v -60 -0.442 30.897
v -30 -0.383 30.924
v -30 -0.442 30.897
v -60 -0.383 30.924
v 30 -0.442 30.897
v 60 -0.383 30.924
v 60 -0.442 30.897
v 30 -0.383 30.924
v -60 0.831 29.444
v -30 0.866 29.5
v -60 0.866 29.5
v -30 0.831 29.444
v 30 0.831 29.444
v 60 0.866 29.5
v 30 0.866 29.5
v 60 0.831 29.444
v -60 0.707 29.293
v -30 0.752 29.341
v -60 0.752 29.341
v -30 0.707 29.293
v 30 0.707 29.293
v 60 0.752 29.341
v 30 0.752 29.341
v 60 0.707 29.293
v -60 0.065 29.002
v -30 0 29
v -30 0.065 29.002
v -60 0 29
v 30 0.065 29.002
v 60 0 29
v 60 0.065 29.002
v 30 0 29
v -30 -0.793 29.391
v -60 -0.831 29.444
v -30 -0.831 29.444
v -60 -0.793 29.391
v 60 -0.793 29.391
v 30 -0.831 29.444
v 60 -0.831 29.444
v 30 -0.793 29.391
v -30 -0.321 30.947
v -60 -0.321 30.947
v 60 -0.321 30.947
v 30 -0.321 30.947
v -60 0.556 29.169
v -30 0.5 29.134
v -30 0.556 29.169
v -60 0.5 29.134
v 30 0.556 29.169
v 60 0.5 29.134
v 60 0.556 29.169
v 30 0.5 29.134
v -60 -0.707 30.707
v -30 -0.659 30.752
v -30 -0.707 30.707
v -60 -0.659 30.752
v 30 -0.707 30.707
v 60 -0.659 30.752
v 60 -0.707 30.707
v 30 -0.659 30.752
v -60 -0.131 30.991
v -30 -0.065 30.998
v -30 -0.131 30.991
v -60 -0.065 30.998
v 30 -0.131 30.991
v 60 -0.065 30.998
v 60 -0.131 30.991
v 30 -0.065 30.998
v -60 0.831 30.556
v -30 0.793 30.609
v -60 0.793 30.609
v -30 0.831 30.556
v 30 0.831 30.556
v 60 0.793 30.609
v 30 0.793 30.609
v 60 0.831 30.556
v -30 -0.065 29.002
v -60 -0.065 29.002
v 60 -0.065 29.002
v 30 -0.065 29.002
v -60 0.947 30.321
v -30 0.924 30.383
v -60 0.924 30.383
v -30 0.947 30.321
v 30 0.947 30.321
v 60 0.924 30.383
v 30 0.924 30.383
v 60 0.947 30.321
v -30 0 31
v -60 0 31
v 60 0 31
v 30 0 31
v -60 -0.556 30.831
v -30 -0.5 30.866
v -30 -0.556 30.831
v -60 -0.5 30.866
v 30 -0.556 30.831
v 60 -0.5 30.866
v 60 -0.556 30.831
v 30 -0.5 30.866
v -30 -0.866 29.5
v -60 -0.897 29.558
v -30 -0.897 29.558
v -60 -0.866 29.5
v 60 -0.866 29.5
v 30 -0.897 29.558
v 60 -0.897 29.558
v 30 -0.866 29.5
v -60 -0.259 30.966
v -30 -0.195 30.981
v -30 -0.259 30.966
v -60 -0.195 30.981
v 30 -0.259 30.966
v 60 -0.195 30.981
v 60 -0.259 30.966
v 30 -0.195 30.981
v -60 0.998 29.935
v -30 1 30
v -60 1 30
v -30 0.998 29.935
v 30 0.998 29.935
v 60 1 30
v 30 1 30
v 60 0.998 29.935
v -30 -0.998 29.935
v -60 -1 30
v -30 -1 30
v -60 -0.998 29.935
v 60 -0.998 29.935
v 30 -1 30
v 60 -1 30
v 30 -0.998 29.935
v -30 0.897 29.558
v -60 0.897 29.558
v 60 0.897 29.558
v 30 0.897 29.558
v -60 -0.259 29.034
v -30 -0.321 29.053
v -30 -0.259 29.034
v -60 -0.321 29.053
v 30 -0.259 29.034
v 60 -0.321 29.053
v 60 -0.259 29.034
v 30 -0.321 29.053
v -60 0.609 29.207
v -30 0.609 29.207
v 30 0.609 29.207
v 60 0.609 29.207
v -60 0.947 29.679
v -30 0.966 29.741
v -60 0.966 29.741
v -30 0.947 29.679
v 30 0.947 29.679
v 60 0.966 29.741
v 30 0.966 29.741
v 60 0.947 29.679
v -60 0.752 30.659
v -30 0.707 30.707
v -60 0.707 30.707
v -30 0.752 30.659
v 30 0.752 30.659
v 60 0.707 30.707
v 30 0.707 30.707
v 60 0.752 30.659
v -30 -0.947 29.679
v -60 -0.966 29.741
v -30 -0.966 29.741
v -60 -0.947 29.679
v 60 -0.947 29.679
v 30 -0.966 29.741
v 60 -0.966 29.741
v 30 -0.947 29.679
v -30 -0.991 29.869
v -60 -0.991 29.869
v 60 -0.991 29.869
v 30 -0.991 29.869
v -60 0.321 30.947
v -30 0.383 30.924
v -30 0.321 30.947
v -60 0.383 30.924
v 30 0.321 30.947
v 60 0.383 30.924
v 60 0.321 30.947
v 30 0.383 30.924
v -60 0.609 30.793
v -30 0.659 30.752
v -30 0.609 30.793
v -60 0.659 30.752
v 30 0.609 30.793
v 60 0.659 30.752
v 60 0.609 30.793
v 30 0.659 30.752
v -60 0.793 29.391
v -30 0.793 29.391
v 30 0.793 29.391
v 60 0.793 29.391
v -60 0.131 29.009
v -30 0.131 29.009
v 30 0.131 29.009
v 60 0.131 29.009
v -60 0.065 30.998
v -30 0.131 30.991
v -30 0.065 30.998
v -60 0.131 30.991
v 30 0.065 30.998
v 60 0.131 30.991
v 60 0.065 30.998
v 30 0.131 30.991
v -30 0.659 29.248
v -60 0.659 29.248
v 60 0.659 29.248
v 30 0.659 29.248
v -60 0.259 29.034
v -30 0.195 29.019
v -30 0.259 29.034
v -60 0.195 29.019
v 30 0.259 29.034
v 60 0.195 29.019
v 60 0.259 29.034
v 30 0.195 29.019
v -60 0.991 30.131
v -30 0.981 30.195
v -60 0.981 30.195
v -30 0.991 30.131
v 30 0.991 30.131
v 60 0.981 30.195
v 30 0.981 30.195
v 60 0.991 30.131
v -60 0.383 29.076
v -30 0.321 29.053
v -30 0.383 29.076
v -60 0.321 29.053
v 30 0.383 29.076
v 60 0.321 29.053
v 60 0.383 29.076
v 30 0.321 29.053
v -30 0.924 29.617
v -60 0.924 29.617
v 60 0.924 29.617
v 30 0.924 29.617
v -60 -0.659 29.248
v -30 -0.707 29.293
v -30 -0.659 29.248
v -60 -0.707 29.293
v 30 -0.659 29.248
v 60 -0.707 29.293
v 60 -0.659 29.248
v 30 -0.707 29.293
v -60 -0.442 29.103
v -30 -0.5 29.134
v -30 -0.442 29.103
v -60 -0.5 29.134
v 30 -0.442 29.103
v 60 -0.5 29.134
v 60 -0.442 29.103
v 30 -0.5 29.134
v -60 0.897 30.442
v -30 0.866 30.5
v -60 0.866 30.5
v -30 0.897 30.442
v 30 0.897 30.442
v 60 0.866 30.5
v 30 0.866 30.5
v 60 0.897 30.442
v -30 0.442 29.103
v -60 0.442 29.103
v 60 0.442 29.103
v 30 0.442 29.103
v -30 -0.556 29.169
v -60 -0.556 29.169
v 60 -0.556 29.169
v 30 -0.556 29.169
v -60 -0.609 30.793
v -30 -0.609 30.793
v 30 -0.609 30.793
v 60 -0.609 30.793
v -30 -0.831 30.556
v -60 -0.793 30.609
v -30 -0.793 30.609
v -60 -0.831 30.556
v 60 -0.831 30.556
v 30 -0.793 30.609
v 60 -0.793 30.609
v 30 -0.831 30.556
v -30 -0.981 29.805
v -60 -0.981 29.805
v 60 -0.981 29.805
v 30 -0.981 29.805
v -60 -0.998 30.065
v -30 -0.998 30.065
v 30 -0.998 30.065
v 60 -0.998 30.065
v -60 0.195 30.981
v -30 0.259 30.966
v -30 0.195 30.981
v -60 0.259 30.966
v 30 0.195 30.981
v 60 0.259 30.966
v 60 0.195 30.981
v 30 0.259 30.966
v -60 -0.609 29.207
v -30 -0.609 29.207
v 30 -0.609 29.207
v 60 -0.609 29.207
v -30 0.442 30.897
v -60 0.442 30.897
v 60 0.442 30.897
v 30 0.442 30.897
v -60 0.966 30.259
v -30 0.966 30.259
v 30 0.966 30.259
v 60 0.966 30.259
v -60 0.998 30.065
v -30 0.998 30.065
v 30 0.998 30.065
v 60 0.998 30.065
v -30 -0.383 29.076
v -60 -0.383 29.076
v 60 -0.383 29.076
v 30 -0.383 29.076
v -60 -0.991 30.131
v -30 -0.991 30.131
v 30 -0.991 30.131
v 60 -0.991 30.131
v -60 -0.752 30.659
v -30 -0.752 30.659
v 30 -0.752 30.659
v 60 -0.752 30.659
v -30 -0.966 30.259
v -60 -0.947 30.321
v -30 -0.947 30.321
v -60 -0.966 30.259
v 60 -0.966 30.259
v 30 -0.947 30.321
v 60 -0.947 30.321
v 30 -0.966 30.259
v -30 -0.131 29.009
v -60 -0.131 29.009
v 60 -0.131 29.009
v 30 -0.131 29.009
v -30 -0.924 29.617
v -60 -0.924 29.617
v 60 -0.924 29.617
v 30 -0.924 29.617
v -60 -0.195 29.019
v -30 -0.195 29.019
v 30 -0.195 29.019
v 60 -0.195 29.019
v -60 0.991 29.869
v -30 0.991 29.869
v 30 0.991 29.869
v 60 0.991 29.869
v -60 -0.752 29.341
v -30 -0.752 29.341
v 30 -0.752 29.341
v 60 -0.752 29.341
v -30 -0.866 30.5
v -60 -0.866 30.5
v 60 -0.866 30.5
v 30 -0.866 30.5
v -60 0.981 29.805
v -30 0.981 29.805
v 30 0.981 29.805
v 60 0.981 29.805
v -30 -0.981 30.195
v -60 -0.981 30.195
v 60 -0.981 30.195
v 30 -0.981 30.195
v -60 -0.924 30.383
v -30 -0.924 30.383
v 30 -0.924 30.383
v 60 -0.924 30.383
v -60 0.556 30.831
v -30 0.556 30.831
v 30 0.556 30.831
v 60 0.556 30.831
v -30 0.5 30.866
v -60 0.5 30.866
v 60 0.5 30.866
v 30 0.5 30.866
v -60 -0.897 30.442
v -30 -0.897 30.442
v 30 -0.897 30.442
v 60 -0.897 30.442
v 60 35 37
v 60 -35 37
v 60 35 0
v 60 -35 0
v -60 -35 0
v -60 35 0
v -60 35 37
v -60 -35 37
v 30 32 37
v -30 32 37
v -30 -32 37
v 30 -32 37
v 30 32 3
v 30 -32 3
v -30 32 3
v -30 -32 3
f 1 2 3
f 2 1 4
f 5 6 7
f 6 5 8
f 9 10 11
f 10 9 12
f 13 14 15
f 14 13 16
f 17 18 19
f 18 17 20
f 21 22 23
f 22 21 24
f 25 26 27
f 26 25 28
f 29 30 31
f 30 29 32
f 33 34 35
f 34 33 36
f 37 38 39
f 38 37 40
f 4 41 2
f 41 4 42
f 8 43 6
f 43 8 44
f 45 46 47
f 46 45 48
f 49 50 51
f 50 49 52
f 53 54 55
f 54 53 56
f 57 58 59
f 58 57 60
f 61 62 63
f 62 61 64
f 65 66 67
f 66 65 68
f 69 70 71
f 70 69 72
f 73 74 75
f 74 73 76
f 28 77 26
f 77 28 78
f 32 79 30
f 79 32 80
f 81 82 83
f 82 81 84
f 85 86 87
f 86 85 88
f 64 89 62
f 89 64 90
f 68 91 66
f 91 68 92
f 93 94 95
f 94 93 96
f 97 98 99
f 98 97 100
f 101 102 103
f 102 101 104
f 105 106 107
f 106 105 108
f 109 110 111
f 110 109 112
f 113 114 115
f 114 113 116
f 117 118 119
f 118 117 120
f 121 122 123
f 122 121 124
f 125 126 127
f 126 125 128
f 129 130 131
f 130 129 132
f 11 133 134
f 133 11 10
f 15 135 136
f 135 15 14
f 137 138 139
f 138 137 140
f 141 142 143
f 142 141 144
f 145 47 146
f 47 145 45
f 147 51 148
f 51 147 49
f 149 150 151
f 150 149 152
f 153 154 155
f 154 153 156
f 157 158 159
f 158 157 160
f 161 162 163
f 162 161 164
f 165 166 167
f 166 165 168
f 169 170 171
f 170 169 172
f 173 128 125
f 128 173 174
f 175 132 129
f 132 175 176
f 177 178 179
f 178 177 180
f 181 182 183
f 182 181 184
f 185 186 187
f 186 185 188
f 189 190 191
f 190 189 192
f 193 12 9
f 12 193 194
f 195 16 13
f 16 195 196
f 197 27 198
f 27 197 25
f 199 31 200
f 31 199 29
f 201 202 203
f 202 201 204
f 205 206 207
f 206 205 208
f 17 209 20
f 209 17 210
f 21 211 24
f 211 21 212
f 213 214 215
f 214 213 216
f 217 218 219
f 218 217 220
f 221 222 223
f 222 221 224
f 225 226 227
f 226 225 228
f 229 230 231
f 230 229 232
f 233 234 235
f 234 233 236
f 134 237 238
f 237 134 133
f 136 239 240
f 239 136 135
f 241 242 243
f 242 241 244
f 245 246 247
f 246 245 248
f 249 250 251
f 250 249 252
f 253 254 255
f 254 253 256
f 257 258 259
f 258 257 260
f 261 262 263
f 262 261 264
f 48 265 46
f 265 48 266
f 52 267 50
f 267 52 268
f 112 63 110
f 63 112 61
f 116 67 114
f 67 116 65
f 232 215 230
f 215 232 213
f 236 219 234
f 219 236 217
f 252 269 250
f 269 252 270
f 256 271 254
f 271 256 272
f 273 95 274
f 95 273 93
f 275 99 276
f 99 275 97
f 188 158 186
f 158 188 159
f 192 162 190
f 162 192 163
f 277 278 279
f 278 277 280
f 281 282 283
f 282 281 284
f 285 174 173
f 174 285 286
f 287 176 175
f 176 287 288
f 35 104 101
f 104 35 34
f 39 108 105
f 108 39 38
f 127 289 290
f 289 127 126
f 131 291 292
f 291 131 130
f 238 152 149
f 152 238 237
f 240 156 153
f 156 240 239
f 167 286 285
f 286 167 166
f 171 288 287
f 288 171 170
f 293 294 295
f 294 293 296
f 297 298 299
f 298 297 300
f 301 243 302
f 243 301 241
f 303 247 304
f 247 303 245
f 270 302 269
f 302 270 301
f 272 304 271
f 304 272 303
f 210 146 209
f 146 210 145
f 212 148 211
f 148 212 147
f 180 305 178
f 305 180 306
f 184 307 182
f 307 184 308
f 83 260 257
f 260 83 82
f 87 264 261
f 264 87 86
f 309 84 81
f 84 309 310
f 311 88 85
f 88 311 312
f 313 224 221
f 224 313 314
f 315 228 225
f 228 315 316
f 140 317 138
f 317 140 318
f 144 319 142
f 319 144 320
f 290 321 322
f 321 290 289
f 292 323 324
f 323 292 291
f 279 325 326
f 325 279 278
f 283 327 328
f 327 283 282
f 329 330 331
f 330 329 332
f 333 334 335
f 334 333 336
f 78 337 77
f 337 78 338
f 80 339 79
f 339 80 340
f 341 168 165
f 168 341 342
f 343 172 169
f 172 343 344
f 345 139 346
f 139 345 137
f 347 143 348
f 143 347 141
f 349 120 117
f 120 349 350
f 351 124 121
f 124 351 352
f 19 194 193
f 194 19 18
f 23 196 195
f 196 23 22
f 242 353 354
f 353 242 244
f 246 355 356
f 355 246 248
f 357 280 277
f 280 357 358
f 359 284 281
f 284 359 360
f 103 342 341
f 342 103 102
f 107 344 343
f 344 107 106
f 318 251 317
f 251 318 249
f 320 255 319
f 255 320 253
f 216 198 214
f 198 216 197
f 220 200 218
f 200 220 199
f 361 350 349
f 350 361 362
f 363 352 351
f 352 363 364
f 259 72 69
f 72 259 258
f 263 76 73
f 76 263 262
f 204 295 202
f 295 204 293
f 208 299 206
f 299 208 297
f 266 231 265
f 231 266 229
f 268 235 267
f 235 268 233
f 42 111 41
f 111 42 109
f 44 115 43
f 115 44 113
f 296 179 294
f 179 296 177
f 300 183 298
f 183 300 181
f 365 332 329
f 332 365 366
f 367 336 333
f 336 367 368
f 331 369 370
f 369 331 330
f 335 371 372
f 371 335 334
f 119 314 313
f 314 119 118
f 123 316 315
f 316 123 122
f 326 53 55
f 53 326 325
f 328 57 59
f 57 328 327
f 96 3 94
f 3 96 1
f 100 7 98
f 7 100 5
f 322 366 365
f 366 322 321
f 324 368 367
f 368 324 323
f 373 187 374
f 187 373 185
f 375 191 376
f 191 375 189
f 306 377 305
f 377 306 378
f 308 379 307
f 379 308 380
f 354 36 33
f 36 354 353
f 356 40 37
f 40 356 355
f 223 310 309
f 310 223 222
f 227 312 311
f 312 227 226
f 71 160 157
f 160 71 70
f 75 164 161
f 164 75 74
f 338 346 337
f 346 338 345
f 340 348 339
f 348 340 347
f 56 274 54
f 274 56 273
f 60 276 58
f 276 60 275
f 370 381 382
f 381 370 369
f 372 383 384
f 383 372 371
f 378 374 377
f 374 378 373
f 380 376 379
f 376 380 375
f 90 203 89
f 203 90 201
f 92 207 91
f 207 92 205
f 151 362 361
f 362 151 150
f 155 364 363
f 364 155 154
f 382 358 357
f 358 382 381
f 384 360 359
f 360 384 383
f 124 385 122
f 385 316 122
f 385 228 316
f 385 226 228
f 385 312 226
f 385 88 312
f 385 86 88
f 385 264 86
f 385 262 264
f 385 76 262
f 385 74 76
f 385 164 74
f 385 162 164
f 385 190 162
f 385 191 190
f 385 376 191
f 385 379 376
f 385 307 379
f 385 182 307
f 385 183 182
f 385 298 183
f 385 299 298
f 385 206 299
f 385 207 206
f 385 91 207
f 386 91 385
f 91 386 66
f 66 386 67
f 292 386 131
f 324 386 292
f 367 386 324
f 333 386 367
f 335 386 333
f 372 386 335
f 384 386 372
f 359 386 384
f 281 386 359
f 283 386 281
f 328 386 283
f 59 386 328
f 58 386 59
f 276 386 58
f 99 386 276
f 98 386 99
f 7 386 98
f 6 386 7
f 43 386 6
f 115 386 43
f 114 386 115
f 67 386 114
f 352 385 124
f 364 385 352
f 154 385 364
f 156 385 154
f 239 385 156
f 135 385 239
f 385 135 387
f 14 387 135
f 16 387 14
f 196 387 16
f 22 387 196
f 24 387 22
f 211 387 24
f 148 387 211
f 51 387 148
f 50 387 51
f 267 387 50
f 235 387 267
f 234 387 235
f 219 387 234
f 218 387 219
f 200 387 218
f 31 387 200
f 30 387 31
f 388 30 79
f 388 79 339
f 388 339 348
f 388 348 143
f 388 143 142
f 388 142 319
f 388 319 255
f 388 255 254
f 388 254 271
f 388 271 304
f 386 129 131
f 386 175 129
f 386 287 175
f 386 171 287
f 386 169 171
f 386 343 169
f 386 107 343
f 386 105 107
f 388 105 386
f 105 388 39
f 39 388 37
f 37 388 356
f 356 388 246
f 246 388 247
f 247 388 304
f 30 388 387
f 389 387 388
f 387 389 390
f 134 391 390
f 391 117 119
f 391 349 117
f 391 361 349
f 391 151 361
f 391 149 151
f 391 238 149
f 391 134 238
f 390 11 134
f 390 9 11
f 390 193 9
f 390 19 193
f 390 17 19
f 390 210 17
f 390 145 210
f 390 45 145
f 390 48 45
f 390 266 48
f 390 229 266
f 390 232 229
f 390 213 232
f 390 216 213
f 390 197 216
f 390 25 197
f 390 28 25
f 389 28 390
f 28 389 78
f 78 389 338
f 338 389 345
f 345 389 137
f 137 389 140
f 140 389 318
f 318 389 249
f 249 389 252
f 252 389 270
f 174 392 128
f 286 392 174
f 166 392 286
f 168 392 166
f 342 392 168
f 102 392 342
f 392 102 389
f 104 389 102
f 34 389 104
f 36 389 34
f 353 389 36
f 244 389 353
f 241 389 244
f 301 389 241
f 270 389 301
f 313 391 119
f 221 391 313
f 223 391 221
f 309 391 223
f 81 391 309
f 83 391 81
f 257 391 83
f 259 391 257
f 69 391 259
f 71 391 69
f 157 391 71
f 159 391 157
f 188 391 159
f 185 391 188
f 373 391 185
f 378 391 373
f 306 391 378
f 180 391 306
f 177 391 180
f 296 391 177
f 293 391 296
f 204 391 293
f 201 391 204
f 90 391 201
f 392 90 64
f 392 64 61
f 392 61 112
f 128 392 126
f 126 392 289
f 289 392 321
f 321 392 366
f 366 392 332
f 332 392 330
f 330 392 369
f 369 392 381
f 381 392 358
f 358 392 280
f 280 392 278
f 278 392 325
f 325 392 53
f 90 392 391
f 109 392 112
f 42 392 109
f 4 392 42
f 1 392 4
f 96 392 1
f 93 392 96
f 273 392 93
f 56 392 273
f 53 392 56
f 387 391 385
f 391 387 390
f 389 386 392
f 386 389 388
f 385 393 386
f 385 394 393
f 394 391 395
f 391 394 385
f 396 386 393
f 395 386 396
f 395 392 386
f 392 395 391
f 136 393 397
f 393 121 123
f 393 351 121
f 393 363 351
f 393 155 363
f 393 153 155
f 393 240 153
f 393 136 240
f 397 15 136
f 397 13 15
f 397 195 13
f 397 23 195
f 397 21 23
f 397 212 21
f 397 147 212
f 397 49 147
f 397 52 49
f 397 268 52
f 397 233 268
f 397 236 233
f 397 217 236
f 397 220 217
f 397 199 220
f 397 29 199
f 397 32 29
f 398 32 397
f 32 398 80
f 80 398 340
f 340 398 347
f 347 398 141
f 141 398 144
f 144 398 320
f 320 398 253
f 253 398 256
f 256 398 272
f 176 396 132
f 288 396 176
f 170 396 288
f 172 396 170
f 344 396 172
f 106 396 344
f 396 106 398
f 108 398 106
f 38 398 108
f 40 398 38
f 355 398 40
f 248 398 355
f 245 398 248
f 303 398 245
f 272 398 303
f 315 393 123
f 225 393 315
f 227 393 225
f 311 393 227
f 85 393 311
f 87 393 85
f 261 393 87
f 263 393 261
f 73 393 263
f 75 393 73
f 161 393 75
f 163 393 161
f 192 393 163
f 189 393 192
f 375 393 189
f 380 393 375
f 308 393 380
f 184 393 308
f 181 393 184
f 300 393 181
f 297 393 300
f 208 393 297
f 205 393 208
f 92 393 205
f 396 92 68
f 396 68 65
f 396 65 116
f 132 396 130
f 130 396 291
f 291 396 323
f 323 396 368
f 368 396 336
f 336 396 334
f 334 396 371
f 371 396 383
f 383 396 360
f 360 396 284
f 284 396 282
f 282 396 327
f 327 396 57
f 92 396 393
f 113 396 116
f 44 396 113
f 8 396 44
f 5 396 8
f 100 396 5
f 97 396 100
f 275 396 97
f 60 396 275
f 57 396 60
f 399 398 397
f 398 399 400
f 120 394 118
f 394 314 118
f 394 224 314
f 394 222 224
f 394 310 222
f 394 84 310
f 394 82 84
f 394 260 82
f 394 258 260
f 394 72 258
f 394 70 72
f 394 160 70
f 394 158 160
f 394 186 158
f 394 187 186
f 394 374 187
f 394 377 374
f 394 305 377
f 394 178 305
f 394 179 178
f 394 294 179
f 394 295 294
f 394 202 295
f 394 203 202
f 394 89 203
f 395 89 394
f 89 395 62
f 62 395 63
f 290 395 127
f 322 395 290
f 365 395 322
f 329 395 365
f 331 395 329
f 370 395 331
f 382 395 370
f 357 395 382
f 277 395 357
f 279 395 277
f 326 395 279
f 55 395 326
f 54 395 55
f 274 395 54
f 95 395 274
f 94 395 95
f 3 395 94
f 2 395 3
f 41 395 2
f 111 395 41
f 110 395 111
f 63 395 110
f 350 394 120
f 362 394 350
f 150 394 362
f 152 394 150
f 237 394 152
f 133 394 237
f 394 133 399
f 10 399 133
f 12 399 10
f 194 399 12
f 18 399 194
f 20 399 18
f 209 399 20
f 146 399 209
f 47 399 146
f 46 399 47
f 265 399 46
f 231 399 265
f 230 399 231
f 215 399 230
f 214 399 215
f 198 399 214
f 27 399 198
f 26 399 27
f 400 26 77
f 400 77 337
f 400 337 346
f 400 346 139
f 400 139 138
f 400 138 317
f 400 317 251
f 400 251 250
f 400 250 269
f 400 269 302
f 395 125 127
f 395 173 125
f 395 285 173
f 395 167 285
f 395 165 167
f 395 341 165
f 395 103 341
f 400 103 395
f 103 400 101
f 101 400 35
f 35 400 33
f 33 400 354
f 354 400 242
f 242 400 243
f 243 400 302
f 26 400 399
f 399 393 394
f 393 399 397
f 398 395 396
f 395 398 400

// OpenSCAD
// Mini horizontal gel-electrophoresis buffer tank
// Print orientation: open top facing up (+Z), resting on XY plane at z = 0

// ---------- Parameters ----------
outer_x      = 120;   // outer length in X (mm)
outer_y      = 70;    // outer width in Y (mm)
outer_h      = 40;    // outer height in Z (mm)
wall         = 3;     // wall thickness (mm)
floor        = 3;     // floor thickness (mm)

platform_x   = 60;    // platform length in X (mm), centred
platform_y   = outer_y - 2 * wall;  // platform spans full inner width (mm)
platform_top = outer_h - wall + 10;  // platform top height, 10 mm above inner floor (mm)

hole_d       = 2;     // electrode hole diameter (mm)
hole_y       = 0;     // electrode hole Y position (mm)
hole_z       = 30;    // electrode hole Z position (mm)

eps          = 0.5;   // cutter overshoot past faces (mm)
$fn          = 96;    // curve resolution

// ---------- Derived ----------
inner_h = outer_h - floor - wall;   // inner floor-to-top height (mm)

// ---------- Model ----------
difference() {
    // Main tank body
    translate([-outer_x/2, -outer_y/2, 0])
        cube([outer_x, outer_y, outer_h]);

    // Open top (no lid)
    translate([-outer_x/2 - eps, -outer_y/2 - eps, outer_h - wall])
        cube([outer_x + 2*eps, outer_y + 2*eps, wall + eps]);

    // Raised platform in the middle, centred in X
    translate([-platform_x/2, -platform_y/2, floor])
        cube([platform_x, platform_y, platform_top - floor]);

    // Horizontal electrode holes through each end wall, along X
    for (s = [-1, 1])
        translate([s > 0 ? outer_x/2 - wall : -outer_x/2 - eps, hole_y, hole_z])
            rotate([0, 90, 0])
                cylinder(d = hole_d, h = outer_x + 2*eps);
}
